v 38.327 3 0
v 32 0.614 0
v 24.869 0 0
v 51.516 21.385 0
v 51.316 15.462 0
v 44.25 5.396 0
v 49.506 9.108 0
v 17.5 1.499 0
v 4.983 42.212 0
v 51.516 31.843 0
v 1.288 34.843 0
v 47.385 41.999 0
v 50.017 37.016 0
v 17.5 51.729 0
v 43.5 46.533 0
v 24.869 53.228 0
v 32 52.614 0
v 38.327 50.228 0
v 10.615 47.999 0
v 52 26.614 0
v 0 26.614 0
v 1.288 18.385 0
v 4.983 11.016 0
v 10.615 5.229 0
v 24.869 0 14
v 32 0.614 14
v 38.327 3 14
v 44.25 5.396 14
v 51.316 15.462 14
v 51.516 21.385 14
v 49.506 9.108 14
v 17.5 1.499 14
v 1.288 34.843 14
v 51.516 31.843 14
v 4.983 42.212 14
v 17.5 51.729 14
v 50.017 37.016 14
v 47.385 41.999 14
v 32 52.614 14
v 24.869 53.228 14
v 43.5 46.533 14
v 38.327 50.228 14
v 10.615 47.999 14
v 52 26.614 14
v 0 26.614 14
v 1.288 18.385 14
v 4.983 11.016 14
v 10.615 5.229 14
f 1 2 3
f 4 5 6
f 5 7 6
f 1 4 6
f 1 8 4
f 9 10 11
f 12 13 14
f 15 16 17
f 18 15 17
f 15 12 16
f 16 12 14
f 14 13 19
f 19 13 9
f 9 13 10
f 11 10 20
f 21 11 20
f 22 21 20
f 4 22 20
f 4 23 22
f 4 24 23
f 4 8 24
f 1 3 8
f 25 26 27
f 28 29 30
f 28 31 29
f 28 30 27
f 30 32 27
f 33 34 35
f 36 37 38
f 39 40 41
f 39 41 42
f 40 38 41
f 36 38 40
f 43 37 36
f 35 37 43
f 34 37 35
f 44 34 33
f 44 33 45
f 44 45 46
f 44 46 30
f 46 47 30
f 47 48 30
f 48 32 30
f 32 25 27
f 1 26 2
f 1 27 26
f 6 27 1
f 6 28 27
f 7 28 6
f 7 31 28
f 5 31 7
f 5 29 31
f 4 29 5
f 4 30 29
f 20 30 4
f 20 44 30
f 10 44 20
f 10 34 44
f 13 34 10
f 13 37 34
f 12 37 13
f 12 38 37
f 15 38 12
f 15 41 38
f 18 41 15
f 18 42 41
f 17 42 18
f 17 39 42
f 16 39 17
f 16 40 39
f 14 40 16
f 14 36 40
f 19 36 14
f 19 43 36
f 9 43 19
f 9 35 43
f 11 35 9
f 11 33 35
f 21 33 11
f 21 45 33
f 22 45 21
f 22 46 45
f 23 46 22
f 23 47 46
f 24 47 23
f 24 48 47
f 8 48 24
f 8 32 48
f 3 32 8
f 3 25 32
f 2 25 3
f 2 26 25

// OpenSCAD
$fn = 32;

// ----------------------------------------------------------------------
// Cam disc: base radius 20.0 mm, lift 12.0 mm, 24 profile points
// ----------------------------------------------------------------------

// --- parameters (mm) ---
profile_height = 14;      // extrusion height
profile_points = 24;      // points of the closed outline

profile = [[52, 26.614], [51.516, 31.843], [50.017, 37.016], [47.385, 41.999], [43.5, 46.533], [38.327, 50.228], [32, 52.614], [24.869, 53.228], [17.5, 51.729], [10.615, 47.999], [4.983, 42.212], [1.288, 34.843], [0, 26.614], [1.288, 18.385], [4.983, 11.016], [10.615, 5.229], [17.5, 1.499], [24.869, 0], [32, 0.614], [38.327, 3], [44.25, 5.396], [49.506, 9.108], [51.316, 15.462], [51.516, 21.385]];  // single closed polygon, 24 points, counter clockwise

// --- the one profile operation ---
linear_extrude(height = profile_height) polygon(points = profile);
